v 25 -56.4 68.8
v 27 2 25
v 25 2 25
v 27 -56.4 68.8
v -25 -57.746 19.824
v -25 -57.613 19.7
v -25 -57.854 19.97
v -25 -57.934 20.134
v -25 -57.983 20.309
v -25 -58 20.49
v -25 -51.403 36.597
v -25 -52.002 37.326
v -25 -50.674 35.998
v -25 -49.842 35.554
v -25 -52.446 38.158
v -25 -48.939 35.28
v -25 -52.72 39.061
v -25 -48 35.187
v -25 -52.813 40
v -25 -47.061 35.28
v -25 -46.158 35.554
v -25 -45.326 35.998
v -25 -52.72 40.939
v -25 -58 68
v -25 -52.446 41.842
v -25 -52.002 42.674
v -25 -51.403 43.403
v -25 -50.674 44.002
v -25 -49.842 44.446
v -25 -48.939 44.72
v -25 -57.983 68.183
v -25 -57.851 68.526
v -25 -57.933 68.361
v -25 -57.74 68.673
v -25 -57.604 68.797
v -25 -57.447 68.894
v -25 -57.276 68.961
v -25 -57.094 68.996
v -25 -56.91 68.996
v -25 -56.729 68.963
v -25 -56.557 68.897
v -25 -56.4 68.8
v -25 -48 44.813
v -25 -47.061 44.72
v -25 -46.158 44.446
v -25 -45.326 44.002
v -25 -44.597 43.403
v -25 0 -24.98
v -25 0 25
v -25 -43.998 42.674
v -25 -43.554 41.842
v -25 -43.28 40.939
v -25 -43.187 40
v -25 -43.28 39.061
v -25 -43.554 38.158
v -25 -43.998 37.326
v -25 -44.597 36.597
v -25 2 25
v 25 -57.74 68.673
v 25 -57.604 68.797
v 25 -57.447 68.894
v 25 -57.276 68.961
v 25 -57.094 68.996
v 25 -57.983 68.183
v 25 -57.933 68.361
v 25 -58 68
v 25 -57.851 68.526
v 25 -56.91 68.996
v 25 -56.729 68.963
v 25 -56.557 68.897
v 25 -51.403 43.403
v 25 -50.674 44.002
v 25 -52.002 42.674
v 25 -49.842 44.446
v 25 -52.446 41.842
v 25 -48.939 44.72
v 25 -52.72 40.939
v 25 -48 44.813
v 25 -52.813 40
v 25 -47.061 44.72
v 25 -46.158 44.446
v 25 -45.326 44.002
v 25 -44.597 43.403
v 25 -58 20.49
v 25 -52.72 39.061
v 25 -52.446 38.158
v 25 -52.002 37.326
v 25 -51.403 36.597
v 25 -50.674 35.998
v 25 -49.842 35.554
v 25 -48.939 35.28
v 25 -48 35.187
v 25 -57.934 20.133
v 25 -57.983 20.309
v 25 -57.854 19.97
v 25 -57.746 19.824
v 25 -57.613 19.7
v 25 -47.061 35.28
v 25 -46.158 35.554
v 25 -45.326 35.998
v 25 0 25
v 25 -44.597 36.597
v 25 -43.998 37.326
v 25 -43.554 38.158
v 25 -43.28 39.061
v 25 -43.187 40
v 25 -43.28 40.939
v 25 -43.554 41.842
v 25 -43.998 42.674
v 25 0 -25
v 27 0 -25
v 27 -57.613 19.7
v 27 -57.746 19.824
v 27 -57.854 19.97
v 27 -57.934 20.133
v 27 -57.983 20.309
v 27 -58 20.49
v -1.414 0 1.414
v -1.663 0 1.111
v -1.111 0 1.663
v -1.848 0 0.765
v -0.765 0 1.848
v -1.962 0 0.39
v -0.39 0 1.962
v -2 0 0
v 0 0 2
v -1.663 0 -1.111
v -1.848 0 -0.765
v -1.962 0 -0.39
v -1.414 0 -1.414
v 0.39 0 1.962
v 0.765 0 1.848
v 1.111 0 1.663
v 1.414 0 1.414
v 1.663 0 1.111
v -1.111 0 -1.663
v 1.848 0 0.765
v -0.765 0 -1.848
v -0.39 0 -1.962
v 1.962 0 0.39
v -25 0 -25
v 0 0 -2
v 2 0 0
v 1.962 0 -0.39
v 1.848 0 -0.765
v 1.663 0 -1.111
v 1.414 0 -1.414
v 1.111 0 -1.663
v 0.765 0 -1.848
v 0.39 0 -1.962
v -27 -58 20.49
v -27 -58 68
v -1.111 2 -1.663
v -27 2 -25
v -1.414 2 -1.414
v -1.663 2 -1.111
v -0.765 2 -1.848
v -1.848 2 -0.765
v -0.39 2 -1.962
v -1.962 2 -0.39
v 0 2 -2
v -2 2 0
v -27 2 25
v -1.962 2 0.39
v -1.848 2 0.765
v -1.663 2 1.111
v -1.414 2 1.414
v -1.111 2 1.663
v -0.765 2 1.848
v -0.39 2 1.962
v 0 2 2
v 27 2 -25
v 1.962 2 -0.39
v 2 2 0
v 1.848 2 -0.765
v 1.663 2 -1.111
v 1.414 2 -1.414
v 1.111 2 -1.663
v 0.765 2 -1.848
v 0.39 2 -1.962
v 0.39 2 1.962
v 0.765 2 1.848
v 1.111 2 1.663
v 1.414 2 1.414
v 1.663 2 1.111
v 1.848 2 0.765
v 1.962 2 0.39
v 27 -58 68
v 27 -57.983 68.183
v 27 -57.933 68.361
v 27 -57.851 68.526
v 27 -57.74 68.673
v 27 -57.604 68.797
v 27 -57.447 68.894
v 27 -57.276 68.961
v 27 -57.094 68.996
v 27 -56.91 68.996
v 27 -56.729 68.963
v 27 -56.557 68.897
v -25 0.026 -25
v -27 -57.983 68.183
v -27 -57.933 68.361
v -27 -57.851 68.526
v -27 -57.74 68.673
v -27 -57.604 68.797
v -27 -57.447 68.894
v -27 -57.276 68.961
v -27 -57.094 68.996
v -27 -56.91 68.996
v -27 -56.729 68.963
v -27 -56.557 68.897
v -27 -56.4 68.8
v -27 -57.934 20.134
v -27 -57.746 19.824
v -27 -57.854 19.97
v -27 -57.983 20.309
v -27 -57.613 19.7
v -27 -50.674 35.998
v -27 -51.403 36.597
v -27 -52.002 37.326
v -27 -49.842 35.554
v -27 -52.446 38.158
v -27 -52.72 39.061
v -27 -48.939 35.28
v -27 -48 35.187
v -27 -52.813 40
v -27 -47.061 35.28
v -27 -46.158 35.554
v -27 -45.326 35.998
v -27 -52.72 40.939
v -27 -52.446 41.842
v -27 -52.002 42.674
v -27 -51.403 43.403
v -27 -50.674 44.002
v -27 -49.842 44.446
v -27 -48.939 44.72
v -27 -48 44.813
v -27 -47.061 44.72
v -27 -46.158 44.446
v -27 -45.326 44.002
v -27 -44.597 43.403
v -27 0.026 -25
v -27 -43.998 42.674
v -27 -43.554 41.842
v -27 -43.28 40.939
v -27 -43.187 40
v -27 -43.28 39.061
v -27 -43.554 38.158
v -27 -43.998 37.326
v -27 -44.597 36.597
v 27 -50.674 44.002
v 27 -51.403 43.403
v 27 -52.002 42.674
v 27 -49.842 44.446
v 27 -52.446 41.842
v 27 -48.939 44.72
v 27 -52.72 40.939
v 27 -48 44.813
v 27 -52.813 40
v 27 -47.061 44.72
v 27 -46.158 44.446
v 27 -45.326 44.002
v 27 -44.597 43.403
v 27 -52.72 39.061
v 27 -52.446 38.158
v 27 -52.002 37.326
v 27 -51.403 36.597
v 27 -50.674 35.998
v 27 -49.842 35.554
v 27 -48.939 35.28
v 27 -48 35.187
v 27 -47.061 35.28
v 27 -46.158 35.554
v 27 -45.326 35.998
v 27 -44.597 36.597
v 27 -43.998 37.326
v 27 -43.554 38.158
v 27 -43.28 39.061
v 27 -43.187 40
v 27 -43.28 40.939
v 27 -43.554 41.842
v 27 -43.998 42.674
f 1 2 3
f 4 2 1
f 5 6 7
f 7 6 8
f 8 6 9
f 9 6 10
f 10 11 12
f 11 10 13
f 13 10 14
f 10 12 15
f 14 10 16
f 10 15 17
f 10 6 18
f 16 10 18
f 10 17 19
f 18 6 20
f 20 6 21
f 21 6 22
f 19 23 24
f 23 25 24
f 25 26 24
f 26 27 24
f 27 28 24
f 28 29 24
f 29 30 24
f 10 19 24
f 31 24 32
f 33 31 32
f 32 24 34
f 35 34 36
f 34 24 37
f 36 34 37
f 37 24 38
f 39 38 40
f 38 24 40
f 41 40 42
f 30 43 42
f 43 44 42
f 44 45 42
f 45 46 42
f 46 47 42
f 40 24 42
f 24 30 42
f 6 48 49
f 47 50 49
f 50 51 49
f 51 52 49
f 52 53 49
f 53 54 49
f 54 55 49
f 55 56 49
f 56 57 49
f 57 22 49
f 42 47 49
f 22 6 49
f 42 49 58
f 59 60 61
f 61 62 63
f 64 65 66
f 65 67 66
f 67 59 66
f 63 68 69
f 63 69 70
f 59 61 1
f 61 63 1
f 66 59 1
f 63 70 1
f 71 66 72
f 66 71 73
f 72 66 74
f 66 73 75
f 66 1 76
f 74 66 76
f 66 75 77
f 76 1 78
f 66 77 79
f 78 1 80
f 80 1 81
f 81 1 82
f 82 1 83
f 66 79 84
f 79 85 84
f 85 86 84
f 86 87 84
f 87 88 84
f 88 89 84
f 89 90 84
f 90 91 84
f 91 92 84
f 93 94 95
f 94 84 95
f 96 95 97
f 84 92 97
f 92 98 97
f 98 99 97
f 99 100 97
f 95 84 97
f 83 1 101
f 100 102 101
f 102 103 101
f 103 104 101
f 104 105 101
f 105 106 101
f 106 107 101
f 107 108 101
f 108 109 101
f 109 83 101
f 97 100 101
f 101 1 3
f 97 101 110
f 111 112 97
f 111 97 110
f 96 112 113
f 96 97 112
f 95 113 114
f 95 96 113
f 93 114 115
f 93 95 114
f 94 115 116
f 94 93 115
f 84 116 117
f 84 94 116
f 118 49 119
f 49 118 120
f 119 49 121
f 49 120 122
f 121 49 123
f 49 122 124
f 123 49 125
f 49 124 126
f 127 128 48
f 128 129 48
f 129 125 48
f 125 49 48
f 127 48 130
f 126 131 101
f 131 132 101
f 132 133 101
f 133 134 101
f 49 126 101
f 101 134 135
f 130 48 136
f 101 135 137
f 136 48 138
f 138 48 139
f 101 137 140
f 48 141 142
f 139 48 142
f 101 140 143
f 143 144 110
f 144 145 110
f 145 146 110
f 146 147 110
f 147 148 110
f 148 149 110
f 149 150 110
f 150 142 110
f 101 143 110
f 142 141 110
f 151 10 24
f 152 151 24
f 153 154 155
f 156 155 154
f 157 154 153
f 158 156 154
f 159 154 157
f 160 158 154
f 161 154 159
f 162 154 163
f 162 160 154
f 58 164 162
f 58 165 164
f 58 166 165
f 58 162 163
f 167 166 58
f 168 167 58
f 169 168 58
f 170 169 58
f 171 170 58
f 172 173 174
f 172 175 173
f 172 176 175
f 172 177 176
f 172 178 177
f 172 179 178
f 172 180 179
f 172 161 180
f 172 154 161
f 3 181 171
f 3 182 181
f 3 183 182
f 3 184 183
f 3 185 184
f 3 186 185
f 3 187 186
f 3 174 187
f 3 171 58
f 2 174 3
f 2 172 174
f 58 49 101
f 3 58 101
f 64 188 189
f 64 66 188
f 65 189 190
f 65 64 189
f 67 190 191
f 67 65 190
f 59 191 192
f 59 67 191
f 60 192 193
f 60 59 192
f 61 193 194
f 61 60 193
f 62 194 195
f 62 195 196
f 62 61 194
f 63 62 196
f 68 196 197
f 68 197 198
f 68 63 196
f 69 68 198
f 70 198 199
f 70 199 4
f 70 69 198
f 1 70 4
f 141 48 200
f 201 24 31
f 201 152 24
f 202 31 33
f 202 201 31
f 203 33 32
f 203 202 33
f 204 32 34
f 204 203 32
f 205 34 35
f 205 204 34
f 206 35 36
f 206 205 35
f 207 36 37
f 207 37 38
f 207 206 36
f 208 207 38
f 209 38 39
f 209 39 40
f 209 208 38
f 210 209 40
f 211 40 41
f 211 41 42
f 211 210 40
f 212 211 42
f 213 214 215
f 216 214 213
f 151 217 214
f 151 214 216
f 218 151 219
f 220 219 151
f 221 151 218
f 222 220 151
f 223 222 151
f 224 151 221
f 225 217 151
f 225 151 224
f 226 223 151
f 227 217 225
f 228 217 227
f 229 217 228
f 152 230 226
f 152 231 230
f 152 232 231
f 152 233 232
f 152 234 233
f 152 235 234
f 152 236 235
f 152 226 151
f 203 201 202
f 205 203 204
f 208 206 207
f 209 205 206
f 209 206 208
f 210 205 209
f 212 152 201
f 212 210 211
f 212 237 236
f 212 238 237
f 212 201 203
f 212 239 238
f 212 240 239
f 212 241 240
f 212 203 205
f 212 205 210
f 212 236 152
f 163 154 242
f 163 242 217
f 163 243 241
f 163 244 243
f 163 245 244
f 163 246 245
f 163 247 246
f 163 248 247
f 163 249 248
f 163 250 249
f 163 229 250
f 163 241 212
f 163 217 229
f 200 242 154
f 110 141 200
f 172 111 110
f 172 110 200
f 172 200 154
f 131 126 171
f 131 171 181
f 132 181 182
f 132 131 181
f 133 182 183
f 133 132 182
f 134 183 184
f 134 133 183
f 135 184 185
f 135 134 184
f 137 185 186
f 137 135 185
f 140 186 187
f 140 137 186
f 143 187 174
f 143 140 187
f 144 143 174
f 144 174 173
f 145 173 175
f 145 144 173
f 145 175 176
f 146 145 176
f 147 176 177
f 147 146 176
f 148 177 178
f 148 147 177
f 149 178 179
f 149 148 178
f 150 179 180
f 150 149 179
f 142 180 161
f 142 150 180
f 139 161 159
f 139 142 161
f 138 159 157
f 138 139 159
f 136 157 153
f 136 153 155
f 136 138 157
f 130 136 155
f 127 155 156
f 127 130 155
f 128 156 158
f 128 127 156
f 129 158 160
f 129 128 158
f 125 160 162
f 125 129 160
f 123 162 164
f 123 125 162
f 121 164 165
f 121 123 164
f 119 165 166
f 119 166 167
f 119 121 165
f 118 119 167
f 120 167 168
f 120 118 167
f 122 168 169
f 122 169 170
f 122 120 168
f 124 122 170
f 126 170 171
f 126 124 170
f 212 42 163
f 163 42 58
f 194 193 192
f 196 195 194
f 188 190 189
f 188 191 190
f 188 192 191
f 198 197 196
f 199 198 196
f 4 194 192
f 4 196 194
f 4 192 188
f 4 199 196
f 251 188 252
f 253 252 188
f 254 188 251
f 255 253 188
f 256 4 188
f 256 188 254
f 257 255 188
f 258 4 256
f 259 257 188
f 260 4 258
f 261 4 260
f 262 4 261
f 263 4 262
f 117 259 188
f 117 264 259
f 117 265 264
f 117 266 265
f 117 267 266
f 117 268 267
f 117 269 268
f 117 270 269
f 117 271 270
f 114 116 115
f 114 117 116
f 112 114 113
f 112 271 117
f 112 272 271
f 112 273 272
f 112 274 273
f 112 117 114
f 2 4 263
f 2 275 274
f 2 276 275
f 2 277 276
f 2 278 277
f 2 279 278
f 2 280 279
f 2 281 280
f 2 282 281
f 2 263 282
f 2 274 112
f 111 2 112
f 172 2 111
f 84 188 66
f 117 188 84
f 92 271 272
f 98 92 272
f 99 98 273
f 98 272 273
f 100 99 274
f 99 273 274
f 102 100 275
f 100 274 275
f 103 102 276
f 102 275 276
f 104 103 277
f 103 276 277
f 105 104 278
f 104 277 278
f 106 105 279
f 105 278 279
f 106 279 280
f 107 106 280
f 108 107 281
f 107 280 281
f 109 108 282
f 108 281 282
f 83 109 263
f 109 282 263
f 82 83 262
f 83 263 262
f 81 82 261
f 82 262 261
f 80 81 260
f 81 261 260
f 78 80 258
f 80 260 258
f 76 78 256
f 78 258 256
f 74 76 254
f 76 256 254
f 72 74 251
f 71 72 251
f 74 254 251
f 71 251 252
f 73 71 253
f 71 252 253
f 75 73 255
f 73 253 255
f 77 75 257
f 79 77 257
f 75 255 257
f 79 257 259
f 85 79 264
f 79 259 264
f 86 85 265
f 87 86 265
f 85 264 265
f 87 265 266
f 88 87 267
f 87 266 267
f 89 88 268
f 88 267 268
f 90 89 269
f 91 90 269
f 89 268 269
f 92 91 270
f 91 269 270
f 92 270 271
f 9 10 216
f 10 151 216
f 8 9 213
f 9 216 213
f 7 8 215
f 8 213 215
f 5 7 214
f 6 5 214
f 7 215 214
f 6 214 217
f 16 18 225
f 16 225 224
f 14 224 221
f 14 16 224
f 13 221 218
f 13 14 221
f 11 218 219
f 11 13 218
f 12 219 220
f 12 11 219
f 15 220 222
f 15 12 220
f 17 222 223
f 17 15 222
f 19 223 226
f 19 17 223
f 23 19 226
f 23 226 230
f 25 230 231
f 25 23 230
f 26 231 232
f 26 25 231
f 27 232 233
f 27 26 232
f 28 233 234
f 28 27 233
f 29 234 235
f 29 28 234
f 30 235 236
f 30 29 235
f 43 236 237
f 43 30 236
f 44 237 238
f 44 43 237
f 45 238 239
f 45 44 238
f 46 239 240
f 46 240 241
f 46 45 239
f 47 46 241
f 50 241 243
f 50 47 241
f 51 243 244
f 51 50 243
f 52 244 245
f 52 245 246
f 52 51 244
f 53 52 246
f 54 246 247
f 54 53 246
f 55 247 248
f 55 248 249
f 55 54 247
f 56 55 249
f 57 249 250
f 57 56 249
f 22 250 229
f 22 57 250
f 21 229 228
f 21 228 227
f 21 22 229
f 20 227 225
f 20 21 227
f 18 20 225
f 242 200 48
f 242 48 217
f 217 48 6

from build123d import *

# Parameters (mm, degrees)
SKETCH2_W           = 50
SKETCH2_H           = 50
SKETCH2_R           = 2
BOSS_EXTRUDE1_DEPTH = 2
SKETCH4_R           = 4.812837504
BOSS_EXTRUDE2_DEPTH = 2
BOSS_EXTRUDE3_START = 2
SKETCH3_R           = 4.812837504
BOSS_EXTRUDE3_DEPTH = 2
FILLET1_R           = 1
FILLET2_R           = 1


with BuildPart() as part:
    # Sketch2 → Boss-Extrude1 (new body)
    with BuildSketch(Plane(origin=(0, 0, 0), x_dir=(1, 0, 0), z_dir=(0, 1, 0))):
        Rectangle(SKETCH2_W, SKETCH2_H)
        with Locations(Location((0, 0, 0), (0, 0, 270))):
            Circle(SKETCH2_R, mode=Mode.SUBTRACT)
    extrude(amount=BOSS_EXTRUDE1_DEPTH)

    # Sketch4 → Boss-Extrude2 (add)
    with BuildSketch(Plane.ZY.offset(25)):
        Polygon((25, 2), (-25, 2), (-25, 0.026324244), (20, -58), (70, -58), align=None)
        with Locations(Location((40, -48, 0), (0, 0, 180))):
            Circle(SKETCH4_R, mode=Mode.SUBTRACT)
    extrude(amount=BOSS_EXTRUDE2_DEPTH)

    # Sketch3 → Boss-Extrude3 (add)
    with BuildSketch(Plane(origin=(25, 0, 0), x_dir=(0, 0, -1), z_dir=(1, 0, 0)).offset(BOSS_EXTRUDE3_START)):
        Polygon((-25, 2), (-70, -58), (-20, -58), (25, 0), (25, 2), align=None)
        with Locations((-40, -48)):
            Circle(SKETCH3_R, mode=Mode.SUBTRACT)
    extrude(amount=-BOSS_EXTRUDE3_DEPTH)

    # Fillet1
    fillet1_edges = [part.edges().sort_by_distance(p)[0] for p in [
        (-26, -58, 20),
        (26, -58, 20),
    ]]
    fillet(fillet1_edges, radius=FILLET1_R)

    # Fillet2
    fillet2_edges = [part.edges().sort_by_distance(p)[0] for p in [
        (-26, -58, 70),
        (26, -58, 70),
    ]]
    fillet(fillet2_edges, radius=FILLET2_R)


solid = part.part
